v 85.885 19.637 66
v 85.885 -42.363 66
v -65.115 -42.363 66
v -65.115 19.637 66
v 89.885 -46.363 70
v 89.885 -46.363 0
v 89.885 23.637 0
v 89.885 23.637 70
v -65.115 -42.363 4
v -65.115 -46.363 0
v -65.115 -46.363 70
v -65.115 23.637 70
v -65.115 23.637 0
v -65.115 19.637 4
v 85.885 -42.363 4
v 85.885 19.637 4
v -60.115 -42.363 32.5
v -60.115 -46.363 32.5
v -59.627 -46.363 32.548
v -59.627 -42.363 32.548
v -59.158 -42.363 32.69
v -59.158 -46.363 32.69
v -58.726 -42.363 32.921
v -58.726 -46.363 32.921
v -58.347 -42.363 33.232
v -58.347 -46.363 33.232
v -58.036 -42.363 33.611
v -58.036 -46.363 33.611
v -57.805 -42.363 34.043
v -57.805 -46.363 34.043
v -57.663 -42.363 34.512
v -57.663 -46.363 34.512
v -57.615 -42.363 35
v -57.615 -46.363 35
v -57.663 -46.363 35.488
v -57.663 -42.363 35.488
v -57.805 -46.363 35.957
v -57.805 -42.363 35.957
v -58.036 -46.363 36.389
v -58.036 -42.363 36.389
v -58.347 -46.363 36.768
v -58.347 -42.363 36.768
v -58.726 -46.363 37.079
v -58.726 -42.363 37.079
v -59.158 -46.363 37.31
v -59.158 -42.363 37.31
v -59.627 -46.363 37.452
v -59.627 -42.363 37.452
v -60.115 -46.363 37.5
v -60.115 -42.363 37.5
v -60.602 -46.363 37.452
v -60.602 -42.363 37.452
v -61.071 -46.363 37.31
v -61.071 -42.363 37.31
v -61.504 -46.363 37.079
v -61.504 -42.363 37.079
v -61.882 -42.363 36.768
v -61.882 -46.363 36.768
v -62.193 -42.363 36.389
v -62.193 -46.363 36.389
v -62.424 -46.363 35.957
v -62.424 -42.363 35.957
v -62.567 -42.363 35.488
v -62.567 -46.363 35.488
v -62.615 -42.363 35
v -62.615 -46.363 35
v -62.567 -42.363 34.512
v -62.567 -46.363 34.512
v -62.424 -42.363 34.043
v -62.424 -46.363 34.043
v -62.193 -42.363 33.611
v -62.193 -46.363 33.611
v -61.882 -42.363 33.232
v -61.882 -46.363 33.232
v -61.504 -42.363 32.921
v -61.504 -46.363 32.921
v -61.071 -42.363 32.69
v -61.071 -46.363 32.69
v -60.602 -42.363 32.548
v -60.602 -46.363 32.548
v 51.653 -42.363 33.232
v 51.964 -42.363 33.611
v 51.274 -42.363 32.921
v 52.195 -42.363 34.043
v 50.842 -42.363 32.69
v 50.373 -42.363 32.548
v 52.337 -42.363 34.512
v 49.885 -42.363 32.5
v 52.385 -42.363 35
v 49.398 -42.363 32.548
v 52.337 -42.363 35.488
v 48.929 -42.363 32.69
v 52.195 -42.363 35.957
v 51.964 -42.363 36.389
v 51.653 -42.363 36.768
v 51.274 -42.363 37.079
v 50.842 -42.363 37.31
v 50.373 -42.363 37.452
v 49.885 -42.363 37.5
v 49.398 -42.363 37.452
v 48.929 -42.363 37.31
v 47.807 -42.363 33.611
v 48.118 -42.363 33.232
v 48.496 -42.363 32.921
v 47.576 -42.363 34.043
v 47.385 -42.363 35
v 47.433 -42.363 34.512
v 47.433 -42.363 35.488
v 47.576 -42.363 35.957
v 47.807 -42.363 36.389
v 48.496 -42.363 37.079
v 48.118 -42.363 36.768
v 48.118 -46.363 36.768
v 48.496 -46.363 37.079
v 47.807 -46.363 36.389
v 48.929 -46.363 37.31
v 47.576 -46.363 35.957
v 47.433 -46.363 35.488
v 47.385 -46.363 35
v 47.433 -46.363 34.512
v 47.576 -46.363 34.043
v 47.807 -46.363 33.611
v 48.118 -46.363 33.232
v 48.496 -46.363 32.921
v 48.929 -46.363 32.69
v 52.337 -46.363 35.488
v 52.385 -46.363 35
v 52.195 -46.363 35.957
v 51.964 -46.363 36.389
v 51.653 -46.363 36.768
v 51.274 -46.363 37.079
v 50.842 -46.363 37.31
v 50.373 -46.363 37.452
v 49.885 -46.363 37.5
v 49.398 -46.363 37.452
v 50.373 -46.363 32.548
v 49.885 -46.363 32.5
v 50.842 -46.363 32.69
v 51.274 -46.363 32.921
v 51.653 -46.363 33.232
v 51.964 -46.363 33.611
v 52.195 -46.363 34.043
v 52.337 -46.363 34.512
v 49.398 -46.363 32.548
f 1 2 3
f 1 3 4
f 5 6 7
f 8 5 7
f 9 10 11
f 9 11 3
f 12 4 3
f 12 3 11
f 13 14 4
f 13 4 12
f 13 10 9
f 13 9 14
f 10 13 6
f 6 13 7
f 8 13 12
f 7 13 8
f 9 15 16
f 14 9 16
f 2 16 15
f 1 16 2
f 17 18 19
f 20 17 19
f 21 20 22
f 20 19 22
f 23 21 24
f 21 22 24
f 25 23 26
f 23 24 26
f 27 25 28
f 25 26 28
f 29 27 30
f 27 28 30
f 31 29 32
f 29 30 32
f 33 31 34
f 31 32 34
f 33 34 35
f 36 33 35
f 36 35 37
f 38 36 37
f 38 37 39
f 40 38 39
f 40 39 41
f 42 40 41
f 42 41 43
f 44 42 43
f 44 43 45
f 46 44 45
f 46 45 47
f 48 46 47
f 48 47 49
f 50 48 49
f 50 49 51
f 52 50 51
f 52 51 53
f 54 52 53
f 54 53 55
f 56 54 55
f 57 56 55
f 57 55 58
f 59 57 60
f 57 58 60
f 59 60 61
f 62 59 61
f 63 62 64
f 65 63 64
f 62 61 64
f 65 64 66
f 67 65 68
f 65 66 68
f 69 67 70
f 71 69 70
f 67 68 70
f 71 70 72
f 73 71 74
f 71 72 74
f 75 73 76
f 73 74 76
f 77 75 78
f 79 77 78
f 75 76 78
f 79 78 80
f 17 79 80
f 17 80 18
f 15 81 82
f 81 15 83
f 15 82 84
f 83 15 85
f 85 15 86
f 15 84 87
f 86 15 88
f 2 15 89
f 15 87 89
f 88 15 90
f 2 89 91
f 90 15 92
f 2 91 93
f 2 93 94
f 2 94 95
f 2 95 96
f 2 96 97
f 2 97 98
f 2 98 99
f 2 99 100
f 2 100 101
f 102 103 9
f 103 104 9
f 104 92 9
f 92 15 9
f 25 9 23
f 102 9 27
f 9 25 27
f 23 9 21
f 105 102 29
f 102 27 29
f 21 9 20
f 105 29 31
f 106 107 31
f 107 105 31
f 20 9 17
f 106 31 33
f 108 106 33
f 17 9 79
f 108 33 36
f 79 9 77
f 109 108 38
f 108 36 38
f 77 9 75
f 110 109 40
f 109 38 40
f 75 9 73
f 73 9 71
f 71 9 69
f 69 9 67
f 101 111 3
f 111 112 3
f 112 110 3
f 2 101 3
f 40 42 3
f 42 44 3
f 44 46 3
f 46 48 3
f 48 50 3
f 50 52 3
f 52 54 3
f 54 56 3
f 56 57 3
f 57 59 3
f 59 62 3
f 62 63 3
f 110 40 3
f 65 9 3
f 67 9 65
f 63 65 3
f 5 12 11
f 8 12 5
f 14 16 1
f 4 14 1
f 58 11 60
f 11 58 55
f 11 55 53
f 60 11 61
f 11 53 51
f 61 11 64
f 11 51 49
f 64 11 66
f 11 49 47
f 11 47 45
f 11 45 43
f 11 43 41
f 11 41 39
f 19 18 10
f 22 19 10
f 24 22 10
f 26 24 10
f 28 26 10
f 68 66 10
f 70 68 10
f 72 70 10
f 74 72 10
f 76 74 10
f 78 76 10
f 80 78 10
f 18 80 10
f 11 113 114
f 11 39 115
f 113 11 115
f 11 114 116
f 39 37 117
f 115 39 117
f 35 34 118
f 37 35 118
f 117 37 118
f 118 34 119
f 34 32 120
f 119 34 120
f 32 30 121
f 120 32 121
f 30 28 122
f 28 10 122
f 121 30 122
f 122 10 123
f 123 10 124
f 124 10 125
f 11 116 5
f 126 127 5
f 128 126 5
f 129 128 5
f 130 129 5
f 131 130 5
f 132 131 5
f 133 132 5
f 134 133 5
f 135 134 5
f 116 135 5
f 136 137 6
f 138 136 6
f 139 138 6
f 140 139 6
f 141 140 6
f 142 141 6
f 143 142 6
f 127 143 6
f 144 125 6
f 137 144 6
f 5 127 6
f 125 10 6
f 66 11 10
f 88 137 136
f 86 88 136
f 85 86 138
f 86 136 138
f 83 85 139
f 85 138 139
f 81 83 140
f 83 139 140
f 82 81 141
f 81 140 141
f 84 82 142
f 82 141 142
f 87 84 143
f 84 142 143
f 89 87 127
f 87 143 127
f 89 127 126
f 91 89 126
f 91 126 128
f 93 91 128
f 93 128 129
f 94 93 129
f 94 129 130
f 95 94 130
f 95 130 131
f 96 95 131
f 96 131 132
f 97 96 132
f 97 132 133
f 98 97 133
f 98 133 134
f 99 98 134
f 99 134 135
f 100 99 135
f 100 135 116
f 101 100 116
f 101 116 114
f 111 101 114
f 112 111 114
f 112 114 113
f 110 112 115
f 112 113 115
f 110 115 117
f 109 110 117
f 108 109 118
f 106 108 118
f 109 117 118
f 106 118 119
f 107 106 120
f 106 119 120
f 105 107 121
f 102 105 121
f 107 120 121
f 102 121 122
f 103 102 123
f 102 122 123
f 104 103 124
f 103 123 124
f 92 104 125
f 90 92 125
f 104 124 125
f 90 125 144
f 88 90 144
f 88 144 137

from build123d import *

# Parameters (mm, degrees)
ESQUISSE1_W             = 155
ESQUISSE1_H             = 70
BOSS_EXTRU_1_DEPTH      = 70
ESQUISSE2_W             = 62
ESQUISSE2_H             = 62
ENL_V_MAT_EXTRU_1_DEPTH = 151
ESQUISSE3_R             = 2.5
ENL_V_MAT_EXTRU_2_DEPTH = 5


with BuildPart() as part:
    # Esquisse1 → Boss.-Extru.1 (new body)
    with BuildSketch(Plane.XY):
        with Locations((12.385350745, -11.363216266)):
            Rectangle(ESQUISSE1_W, ESQUISSE1_H)
    extrude(amount=BOSS_EXTRU_1_DEPTH)

    # Esquisse2 → Enlèv. mat.-Extru.1 (cut)
    with BuildSketch(Plane.ZY.offset(65.114649255)):
        with Locations((35, -11.363216266)):
            Rectangle(ESQUISSE2_W, ESQUISSE2_H)
    extrude(amount=-ENL_V_MAT_EXTRU_1_DEPTH, mode=Mode.SUBTRACT)

    # Esquisse3 → Enlèv. mat.-Extru.2 (cut)
    with BuildSketch(Plane.XZ.offset(46.363216266)):
        with Locations(Location((-60.114649255, 35, 0), (0, 0, 270))):
            Circle(ESQUISSE3_R)
        with Locations(Location((49.885350745, 35, 0), (0, 0, 270))):
            Circle(ESQUISSE3_R)
    extrude(amount=-ENL_V_MAT_EXTRU_2_DEPTH, mode=Mode.SUBTRACT)


solid = part.part
